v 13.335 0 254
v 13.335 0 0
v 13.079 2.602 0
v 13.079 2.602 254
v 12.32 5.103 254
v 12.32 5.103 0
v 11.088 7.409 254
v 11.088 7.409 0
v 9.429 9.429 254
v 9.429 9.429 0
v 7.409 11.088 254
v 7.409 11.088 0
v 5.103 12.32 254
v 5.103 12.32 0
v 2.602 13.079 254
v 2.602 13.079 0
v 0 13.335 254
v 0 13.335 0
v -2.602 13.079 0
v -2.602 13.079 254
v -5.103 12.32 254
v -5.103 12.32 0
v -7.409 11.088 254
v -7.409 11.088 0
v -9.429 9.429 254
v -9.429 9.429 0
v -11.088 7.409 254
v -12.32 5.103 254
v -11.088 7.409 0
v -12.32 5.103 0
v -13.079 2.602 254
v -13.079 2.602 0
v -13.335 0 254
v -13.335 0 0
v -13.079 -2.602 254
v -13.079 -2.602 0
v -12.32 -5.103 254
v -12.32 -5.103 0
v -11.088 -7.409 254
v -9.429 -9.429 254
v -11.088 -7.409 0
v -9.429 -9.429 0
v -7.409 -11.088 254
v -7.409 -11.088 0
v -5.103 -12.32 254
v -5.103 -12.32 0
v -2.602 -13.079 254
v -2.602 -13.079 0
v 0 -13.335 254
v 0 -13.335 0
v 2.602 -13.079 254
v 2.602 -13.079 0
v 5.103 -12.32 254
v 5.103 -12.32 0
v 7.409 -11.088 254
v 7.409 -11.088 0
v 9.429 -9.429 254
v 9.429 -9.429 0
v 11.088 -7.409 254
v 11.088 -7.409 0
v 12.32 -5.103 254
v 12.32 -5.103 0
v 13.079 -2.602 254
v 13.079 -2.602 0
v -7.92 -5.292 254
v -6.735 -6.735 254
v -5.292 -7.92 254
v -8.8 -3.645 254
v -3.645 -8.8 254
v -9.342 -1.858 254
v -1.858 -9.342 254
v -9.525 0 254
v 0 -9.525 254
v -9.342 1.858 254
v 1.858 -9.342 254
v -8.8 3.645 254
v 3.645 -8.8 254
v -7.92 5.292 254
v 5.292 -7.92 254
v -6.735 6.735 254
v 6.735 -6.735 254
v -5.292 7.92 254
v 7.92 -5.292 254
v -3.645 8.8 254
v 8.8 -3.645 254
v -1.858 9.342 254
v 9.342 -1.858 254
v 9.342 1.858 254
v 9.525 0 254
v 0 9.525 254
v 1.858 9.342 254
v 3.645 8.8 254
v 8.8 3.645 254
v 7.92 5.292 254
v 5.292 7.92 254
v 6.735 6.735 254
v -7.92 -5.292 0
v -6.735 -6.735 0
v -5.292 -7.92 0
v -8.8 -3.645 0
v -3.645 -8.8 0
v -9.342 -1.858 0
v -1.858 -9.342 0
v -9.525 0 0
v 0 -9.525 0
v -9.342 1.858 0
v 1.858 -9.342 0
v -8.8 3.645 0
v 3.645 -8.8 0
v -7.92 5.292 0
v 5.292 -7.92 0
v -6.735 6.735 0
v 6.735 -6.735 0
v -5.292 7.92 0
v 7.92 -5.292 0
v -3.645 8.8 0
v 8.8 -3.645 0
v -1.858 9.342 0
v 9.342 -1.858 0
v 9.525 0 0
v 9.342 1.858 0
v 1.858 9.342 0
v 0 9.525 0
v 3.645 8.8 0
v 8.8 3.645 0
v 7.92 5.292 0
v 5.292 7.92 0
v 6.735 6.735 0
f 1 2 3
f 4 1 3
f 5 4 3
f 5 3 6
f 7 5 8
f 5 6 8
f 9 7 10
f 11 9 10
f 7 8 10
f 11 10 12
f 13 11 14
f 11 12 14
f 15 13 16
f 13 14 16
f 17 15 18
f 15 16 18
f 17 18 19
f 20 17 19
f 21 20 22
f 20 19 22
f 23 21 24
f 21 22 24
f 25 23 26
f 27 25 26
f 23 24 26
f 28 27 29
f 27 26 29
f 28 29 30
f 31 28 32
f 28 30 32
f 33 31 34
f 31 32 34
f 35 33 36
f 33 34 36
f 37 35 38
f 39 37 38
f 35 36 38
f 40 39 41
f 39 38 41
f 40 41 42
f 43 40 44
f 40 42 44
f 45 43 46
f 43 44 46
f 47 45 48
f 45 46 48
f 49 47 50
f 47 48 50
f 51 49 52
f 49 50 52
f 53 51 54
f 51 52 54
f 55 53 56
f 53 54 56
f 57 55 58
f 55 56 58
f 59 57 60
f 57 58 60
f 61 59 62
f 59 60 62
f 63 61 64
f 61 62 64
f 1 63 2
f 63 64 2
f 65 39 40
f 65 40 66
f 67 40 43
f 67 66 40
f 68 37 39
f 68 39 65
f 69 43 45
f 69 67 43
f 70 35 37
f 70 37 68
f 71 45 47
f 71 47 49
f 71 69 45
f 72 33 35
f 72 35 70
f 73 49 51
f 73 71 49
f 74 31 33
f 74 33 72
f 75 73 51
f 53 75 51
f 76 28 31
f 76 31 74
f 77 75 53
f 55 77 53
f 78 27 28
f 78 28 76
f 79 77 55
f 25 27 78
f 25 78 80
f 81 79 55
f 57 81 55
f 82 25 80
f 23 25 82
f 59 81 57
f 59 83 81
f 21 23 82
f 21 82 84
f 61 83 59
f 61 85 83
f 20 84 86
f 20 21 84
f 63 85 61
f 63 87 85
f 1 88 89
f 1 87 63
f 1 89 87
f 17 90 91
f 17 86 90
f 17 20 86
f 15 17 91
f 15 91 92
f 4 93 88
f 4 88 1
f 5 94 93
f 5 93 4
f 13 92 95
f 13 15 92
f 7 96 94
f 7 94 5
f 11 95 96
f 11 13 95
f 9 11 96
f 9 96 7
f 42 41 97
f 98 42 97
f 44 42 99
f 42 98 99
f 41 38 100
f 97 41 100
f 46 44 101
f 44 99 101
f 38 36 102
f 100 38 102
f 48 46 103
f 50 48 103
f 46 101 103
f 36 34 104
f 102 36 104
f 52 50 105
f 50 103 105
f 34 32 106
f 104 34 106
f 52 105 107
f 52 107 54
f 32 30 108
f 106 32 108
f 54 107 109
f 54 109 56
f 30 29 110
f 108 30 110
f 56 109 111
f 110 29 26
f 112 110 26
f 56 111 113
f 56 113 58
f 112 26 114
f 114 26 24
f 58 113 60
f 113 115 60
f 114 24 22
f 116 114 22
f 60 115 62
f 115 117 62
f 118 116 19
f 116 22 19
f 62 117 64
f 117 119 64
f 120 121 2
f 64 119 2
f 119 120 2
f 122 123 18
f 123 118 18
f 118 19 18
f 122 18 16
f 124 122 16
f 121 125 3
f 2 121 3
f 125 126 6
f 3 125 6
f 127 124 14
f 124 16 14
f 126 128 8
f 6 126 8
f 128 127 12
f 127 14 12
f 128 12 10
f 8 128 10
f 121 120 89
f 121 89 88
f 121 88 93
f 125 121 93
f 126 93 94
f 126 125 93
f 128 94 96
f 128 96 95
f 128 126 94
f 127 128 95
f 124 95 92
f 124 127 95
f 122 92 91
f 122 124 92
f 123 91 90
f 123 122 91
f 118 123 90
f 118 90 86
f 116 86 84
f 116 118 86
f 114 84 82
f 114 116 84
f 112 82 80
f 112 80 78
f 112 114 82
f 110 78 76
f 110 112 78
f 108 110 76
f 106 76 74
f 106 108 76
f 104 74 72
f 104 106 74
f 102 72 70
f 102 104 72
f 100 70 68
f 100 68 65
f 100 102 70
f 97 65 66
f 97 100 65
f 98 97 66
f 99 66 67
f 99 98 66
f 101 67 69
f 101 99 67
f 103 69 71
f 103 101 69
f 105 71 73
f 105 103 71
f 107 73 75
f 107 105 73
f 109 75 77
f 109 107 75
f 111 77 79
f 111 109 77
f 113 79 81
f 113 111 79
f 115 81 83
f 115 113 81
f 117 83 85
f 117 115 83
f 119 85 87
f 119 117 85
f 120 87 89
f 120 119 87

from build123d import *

# Parameters (mm, degrees)
CYLINDER001_R     = 9.525
CYLINDER001_DEPTH = 254
CYLINDER_R        = 13.335
CYLINDER_DEPTH    = 254


with BuildPart() as f_0_75_id:
    # Cylinder001 → Cylinder001 (new body)
    with BuildSketch(Plane.XY):
        Circle(CYLINDER001_R)
    extrude(amount=CYLINDER001_DEPTH)


with BuildPart() as f_0_75in_x_10in_npt_pipe:
    # Cylinder → Cylinder (new body)
    with BuildSketch(Plane.XY):
        Circle(CYLINDER_R)
    extrude(amount=CYLINDER_DEPTH)

    # Cut: cut 0.75 ID
    add(f_0_75_id.part, mode=Mode.SUBTRACT)


solid = f_0_75in_x_10in_npt_pipe.part
